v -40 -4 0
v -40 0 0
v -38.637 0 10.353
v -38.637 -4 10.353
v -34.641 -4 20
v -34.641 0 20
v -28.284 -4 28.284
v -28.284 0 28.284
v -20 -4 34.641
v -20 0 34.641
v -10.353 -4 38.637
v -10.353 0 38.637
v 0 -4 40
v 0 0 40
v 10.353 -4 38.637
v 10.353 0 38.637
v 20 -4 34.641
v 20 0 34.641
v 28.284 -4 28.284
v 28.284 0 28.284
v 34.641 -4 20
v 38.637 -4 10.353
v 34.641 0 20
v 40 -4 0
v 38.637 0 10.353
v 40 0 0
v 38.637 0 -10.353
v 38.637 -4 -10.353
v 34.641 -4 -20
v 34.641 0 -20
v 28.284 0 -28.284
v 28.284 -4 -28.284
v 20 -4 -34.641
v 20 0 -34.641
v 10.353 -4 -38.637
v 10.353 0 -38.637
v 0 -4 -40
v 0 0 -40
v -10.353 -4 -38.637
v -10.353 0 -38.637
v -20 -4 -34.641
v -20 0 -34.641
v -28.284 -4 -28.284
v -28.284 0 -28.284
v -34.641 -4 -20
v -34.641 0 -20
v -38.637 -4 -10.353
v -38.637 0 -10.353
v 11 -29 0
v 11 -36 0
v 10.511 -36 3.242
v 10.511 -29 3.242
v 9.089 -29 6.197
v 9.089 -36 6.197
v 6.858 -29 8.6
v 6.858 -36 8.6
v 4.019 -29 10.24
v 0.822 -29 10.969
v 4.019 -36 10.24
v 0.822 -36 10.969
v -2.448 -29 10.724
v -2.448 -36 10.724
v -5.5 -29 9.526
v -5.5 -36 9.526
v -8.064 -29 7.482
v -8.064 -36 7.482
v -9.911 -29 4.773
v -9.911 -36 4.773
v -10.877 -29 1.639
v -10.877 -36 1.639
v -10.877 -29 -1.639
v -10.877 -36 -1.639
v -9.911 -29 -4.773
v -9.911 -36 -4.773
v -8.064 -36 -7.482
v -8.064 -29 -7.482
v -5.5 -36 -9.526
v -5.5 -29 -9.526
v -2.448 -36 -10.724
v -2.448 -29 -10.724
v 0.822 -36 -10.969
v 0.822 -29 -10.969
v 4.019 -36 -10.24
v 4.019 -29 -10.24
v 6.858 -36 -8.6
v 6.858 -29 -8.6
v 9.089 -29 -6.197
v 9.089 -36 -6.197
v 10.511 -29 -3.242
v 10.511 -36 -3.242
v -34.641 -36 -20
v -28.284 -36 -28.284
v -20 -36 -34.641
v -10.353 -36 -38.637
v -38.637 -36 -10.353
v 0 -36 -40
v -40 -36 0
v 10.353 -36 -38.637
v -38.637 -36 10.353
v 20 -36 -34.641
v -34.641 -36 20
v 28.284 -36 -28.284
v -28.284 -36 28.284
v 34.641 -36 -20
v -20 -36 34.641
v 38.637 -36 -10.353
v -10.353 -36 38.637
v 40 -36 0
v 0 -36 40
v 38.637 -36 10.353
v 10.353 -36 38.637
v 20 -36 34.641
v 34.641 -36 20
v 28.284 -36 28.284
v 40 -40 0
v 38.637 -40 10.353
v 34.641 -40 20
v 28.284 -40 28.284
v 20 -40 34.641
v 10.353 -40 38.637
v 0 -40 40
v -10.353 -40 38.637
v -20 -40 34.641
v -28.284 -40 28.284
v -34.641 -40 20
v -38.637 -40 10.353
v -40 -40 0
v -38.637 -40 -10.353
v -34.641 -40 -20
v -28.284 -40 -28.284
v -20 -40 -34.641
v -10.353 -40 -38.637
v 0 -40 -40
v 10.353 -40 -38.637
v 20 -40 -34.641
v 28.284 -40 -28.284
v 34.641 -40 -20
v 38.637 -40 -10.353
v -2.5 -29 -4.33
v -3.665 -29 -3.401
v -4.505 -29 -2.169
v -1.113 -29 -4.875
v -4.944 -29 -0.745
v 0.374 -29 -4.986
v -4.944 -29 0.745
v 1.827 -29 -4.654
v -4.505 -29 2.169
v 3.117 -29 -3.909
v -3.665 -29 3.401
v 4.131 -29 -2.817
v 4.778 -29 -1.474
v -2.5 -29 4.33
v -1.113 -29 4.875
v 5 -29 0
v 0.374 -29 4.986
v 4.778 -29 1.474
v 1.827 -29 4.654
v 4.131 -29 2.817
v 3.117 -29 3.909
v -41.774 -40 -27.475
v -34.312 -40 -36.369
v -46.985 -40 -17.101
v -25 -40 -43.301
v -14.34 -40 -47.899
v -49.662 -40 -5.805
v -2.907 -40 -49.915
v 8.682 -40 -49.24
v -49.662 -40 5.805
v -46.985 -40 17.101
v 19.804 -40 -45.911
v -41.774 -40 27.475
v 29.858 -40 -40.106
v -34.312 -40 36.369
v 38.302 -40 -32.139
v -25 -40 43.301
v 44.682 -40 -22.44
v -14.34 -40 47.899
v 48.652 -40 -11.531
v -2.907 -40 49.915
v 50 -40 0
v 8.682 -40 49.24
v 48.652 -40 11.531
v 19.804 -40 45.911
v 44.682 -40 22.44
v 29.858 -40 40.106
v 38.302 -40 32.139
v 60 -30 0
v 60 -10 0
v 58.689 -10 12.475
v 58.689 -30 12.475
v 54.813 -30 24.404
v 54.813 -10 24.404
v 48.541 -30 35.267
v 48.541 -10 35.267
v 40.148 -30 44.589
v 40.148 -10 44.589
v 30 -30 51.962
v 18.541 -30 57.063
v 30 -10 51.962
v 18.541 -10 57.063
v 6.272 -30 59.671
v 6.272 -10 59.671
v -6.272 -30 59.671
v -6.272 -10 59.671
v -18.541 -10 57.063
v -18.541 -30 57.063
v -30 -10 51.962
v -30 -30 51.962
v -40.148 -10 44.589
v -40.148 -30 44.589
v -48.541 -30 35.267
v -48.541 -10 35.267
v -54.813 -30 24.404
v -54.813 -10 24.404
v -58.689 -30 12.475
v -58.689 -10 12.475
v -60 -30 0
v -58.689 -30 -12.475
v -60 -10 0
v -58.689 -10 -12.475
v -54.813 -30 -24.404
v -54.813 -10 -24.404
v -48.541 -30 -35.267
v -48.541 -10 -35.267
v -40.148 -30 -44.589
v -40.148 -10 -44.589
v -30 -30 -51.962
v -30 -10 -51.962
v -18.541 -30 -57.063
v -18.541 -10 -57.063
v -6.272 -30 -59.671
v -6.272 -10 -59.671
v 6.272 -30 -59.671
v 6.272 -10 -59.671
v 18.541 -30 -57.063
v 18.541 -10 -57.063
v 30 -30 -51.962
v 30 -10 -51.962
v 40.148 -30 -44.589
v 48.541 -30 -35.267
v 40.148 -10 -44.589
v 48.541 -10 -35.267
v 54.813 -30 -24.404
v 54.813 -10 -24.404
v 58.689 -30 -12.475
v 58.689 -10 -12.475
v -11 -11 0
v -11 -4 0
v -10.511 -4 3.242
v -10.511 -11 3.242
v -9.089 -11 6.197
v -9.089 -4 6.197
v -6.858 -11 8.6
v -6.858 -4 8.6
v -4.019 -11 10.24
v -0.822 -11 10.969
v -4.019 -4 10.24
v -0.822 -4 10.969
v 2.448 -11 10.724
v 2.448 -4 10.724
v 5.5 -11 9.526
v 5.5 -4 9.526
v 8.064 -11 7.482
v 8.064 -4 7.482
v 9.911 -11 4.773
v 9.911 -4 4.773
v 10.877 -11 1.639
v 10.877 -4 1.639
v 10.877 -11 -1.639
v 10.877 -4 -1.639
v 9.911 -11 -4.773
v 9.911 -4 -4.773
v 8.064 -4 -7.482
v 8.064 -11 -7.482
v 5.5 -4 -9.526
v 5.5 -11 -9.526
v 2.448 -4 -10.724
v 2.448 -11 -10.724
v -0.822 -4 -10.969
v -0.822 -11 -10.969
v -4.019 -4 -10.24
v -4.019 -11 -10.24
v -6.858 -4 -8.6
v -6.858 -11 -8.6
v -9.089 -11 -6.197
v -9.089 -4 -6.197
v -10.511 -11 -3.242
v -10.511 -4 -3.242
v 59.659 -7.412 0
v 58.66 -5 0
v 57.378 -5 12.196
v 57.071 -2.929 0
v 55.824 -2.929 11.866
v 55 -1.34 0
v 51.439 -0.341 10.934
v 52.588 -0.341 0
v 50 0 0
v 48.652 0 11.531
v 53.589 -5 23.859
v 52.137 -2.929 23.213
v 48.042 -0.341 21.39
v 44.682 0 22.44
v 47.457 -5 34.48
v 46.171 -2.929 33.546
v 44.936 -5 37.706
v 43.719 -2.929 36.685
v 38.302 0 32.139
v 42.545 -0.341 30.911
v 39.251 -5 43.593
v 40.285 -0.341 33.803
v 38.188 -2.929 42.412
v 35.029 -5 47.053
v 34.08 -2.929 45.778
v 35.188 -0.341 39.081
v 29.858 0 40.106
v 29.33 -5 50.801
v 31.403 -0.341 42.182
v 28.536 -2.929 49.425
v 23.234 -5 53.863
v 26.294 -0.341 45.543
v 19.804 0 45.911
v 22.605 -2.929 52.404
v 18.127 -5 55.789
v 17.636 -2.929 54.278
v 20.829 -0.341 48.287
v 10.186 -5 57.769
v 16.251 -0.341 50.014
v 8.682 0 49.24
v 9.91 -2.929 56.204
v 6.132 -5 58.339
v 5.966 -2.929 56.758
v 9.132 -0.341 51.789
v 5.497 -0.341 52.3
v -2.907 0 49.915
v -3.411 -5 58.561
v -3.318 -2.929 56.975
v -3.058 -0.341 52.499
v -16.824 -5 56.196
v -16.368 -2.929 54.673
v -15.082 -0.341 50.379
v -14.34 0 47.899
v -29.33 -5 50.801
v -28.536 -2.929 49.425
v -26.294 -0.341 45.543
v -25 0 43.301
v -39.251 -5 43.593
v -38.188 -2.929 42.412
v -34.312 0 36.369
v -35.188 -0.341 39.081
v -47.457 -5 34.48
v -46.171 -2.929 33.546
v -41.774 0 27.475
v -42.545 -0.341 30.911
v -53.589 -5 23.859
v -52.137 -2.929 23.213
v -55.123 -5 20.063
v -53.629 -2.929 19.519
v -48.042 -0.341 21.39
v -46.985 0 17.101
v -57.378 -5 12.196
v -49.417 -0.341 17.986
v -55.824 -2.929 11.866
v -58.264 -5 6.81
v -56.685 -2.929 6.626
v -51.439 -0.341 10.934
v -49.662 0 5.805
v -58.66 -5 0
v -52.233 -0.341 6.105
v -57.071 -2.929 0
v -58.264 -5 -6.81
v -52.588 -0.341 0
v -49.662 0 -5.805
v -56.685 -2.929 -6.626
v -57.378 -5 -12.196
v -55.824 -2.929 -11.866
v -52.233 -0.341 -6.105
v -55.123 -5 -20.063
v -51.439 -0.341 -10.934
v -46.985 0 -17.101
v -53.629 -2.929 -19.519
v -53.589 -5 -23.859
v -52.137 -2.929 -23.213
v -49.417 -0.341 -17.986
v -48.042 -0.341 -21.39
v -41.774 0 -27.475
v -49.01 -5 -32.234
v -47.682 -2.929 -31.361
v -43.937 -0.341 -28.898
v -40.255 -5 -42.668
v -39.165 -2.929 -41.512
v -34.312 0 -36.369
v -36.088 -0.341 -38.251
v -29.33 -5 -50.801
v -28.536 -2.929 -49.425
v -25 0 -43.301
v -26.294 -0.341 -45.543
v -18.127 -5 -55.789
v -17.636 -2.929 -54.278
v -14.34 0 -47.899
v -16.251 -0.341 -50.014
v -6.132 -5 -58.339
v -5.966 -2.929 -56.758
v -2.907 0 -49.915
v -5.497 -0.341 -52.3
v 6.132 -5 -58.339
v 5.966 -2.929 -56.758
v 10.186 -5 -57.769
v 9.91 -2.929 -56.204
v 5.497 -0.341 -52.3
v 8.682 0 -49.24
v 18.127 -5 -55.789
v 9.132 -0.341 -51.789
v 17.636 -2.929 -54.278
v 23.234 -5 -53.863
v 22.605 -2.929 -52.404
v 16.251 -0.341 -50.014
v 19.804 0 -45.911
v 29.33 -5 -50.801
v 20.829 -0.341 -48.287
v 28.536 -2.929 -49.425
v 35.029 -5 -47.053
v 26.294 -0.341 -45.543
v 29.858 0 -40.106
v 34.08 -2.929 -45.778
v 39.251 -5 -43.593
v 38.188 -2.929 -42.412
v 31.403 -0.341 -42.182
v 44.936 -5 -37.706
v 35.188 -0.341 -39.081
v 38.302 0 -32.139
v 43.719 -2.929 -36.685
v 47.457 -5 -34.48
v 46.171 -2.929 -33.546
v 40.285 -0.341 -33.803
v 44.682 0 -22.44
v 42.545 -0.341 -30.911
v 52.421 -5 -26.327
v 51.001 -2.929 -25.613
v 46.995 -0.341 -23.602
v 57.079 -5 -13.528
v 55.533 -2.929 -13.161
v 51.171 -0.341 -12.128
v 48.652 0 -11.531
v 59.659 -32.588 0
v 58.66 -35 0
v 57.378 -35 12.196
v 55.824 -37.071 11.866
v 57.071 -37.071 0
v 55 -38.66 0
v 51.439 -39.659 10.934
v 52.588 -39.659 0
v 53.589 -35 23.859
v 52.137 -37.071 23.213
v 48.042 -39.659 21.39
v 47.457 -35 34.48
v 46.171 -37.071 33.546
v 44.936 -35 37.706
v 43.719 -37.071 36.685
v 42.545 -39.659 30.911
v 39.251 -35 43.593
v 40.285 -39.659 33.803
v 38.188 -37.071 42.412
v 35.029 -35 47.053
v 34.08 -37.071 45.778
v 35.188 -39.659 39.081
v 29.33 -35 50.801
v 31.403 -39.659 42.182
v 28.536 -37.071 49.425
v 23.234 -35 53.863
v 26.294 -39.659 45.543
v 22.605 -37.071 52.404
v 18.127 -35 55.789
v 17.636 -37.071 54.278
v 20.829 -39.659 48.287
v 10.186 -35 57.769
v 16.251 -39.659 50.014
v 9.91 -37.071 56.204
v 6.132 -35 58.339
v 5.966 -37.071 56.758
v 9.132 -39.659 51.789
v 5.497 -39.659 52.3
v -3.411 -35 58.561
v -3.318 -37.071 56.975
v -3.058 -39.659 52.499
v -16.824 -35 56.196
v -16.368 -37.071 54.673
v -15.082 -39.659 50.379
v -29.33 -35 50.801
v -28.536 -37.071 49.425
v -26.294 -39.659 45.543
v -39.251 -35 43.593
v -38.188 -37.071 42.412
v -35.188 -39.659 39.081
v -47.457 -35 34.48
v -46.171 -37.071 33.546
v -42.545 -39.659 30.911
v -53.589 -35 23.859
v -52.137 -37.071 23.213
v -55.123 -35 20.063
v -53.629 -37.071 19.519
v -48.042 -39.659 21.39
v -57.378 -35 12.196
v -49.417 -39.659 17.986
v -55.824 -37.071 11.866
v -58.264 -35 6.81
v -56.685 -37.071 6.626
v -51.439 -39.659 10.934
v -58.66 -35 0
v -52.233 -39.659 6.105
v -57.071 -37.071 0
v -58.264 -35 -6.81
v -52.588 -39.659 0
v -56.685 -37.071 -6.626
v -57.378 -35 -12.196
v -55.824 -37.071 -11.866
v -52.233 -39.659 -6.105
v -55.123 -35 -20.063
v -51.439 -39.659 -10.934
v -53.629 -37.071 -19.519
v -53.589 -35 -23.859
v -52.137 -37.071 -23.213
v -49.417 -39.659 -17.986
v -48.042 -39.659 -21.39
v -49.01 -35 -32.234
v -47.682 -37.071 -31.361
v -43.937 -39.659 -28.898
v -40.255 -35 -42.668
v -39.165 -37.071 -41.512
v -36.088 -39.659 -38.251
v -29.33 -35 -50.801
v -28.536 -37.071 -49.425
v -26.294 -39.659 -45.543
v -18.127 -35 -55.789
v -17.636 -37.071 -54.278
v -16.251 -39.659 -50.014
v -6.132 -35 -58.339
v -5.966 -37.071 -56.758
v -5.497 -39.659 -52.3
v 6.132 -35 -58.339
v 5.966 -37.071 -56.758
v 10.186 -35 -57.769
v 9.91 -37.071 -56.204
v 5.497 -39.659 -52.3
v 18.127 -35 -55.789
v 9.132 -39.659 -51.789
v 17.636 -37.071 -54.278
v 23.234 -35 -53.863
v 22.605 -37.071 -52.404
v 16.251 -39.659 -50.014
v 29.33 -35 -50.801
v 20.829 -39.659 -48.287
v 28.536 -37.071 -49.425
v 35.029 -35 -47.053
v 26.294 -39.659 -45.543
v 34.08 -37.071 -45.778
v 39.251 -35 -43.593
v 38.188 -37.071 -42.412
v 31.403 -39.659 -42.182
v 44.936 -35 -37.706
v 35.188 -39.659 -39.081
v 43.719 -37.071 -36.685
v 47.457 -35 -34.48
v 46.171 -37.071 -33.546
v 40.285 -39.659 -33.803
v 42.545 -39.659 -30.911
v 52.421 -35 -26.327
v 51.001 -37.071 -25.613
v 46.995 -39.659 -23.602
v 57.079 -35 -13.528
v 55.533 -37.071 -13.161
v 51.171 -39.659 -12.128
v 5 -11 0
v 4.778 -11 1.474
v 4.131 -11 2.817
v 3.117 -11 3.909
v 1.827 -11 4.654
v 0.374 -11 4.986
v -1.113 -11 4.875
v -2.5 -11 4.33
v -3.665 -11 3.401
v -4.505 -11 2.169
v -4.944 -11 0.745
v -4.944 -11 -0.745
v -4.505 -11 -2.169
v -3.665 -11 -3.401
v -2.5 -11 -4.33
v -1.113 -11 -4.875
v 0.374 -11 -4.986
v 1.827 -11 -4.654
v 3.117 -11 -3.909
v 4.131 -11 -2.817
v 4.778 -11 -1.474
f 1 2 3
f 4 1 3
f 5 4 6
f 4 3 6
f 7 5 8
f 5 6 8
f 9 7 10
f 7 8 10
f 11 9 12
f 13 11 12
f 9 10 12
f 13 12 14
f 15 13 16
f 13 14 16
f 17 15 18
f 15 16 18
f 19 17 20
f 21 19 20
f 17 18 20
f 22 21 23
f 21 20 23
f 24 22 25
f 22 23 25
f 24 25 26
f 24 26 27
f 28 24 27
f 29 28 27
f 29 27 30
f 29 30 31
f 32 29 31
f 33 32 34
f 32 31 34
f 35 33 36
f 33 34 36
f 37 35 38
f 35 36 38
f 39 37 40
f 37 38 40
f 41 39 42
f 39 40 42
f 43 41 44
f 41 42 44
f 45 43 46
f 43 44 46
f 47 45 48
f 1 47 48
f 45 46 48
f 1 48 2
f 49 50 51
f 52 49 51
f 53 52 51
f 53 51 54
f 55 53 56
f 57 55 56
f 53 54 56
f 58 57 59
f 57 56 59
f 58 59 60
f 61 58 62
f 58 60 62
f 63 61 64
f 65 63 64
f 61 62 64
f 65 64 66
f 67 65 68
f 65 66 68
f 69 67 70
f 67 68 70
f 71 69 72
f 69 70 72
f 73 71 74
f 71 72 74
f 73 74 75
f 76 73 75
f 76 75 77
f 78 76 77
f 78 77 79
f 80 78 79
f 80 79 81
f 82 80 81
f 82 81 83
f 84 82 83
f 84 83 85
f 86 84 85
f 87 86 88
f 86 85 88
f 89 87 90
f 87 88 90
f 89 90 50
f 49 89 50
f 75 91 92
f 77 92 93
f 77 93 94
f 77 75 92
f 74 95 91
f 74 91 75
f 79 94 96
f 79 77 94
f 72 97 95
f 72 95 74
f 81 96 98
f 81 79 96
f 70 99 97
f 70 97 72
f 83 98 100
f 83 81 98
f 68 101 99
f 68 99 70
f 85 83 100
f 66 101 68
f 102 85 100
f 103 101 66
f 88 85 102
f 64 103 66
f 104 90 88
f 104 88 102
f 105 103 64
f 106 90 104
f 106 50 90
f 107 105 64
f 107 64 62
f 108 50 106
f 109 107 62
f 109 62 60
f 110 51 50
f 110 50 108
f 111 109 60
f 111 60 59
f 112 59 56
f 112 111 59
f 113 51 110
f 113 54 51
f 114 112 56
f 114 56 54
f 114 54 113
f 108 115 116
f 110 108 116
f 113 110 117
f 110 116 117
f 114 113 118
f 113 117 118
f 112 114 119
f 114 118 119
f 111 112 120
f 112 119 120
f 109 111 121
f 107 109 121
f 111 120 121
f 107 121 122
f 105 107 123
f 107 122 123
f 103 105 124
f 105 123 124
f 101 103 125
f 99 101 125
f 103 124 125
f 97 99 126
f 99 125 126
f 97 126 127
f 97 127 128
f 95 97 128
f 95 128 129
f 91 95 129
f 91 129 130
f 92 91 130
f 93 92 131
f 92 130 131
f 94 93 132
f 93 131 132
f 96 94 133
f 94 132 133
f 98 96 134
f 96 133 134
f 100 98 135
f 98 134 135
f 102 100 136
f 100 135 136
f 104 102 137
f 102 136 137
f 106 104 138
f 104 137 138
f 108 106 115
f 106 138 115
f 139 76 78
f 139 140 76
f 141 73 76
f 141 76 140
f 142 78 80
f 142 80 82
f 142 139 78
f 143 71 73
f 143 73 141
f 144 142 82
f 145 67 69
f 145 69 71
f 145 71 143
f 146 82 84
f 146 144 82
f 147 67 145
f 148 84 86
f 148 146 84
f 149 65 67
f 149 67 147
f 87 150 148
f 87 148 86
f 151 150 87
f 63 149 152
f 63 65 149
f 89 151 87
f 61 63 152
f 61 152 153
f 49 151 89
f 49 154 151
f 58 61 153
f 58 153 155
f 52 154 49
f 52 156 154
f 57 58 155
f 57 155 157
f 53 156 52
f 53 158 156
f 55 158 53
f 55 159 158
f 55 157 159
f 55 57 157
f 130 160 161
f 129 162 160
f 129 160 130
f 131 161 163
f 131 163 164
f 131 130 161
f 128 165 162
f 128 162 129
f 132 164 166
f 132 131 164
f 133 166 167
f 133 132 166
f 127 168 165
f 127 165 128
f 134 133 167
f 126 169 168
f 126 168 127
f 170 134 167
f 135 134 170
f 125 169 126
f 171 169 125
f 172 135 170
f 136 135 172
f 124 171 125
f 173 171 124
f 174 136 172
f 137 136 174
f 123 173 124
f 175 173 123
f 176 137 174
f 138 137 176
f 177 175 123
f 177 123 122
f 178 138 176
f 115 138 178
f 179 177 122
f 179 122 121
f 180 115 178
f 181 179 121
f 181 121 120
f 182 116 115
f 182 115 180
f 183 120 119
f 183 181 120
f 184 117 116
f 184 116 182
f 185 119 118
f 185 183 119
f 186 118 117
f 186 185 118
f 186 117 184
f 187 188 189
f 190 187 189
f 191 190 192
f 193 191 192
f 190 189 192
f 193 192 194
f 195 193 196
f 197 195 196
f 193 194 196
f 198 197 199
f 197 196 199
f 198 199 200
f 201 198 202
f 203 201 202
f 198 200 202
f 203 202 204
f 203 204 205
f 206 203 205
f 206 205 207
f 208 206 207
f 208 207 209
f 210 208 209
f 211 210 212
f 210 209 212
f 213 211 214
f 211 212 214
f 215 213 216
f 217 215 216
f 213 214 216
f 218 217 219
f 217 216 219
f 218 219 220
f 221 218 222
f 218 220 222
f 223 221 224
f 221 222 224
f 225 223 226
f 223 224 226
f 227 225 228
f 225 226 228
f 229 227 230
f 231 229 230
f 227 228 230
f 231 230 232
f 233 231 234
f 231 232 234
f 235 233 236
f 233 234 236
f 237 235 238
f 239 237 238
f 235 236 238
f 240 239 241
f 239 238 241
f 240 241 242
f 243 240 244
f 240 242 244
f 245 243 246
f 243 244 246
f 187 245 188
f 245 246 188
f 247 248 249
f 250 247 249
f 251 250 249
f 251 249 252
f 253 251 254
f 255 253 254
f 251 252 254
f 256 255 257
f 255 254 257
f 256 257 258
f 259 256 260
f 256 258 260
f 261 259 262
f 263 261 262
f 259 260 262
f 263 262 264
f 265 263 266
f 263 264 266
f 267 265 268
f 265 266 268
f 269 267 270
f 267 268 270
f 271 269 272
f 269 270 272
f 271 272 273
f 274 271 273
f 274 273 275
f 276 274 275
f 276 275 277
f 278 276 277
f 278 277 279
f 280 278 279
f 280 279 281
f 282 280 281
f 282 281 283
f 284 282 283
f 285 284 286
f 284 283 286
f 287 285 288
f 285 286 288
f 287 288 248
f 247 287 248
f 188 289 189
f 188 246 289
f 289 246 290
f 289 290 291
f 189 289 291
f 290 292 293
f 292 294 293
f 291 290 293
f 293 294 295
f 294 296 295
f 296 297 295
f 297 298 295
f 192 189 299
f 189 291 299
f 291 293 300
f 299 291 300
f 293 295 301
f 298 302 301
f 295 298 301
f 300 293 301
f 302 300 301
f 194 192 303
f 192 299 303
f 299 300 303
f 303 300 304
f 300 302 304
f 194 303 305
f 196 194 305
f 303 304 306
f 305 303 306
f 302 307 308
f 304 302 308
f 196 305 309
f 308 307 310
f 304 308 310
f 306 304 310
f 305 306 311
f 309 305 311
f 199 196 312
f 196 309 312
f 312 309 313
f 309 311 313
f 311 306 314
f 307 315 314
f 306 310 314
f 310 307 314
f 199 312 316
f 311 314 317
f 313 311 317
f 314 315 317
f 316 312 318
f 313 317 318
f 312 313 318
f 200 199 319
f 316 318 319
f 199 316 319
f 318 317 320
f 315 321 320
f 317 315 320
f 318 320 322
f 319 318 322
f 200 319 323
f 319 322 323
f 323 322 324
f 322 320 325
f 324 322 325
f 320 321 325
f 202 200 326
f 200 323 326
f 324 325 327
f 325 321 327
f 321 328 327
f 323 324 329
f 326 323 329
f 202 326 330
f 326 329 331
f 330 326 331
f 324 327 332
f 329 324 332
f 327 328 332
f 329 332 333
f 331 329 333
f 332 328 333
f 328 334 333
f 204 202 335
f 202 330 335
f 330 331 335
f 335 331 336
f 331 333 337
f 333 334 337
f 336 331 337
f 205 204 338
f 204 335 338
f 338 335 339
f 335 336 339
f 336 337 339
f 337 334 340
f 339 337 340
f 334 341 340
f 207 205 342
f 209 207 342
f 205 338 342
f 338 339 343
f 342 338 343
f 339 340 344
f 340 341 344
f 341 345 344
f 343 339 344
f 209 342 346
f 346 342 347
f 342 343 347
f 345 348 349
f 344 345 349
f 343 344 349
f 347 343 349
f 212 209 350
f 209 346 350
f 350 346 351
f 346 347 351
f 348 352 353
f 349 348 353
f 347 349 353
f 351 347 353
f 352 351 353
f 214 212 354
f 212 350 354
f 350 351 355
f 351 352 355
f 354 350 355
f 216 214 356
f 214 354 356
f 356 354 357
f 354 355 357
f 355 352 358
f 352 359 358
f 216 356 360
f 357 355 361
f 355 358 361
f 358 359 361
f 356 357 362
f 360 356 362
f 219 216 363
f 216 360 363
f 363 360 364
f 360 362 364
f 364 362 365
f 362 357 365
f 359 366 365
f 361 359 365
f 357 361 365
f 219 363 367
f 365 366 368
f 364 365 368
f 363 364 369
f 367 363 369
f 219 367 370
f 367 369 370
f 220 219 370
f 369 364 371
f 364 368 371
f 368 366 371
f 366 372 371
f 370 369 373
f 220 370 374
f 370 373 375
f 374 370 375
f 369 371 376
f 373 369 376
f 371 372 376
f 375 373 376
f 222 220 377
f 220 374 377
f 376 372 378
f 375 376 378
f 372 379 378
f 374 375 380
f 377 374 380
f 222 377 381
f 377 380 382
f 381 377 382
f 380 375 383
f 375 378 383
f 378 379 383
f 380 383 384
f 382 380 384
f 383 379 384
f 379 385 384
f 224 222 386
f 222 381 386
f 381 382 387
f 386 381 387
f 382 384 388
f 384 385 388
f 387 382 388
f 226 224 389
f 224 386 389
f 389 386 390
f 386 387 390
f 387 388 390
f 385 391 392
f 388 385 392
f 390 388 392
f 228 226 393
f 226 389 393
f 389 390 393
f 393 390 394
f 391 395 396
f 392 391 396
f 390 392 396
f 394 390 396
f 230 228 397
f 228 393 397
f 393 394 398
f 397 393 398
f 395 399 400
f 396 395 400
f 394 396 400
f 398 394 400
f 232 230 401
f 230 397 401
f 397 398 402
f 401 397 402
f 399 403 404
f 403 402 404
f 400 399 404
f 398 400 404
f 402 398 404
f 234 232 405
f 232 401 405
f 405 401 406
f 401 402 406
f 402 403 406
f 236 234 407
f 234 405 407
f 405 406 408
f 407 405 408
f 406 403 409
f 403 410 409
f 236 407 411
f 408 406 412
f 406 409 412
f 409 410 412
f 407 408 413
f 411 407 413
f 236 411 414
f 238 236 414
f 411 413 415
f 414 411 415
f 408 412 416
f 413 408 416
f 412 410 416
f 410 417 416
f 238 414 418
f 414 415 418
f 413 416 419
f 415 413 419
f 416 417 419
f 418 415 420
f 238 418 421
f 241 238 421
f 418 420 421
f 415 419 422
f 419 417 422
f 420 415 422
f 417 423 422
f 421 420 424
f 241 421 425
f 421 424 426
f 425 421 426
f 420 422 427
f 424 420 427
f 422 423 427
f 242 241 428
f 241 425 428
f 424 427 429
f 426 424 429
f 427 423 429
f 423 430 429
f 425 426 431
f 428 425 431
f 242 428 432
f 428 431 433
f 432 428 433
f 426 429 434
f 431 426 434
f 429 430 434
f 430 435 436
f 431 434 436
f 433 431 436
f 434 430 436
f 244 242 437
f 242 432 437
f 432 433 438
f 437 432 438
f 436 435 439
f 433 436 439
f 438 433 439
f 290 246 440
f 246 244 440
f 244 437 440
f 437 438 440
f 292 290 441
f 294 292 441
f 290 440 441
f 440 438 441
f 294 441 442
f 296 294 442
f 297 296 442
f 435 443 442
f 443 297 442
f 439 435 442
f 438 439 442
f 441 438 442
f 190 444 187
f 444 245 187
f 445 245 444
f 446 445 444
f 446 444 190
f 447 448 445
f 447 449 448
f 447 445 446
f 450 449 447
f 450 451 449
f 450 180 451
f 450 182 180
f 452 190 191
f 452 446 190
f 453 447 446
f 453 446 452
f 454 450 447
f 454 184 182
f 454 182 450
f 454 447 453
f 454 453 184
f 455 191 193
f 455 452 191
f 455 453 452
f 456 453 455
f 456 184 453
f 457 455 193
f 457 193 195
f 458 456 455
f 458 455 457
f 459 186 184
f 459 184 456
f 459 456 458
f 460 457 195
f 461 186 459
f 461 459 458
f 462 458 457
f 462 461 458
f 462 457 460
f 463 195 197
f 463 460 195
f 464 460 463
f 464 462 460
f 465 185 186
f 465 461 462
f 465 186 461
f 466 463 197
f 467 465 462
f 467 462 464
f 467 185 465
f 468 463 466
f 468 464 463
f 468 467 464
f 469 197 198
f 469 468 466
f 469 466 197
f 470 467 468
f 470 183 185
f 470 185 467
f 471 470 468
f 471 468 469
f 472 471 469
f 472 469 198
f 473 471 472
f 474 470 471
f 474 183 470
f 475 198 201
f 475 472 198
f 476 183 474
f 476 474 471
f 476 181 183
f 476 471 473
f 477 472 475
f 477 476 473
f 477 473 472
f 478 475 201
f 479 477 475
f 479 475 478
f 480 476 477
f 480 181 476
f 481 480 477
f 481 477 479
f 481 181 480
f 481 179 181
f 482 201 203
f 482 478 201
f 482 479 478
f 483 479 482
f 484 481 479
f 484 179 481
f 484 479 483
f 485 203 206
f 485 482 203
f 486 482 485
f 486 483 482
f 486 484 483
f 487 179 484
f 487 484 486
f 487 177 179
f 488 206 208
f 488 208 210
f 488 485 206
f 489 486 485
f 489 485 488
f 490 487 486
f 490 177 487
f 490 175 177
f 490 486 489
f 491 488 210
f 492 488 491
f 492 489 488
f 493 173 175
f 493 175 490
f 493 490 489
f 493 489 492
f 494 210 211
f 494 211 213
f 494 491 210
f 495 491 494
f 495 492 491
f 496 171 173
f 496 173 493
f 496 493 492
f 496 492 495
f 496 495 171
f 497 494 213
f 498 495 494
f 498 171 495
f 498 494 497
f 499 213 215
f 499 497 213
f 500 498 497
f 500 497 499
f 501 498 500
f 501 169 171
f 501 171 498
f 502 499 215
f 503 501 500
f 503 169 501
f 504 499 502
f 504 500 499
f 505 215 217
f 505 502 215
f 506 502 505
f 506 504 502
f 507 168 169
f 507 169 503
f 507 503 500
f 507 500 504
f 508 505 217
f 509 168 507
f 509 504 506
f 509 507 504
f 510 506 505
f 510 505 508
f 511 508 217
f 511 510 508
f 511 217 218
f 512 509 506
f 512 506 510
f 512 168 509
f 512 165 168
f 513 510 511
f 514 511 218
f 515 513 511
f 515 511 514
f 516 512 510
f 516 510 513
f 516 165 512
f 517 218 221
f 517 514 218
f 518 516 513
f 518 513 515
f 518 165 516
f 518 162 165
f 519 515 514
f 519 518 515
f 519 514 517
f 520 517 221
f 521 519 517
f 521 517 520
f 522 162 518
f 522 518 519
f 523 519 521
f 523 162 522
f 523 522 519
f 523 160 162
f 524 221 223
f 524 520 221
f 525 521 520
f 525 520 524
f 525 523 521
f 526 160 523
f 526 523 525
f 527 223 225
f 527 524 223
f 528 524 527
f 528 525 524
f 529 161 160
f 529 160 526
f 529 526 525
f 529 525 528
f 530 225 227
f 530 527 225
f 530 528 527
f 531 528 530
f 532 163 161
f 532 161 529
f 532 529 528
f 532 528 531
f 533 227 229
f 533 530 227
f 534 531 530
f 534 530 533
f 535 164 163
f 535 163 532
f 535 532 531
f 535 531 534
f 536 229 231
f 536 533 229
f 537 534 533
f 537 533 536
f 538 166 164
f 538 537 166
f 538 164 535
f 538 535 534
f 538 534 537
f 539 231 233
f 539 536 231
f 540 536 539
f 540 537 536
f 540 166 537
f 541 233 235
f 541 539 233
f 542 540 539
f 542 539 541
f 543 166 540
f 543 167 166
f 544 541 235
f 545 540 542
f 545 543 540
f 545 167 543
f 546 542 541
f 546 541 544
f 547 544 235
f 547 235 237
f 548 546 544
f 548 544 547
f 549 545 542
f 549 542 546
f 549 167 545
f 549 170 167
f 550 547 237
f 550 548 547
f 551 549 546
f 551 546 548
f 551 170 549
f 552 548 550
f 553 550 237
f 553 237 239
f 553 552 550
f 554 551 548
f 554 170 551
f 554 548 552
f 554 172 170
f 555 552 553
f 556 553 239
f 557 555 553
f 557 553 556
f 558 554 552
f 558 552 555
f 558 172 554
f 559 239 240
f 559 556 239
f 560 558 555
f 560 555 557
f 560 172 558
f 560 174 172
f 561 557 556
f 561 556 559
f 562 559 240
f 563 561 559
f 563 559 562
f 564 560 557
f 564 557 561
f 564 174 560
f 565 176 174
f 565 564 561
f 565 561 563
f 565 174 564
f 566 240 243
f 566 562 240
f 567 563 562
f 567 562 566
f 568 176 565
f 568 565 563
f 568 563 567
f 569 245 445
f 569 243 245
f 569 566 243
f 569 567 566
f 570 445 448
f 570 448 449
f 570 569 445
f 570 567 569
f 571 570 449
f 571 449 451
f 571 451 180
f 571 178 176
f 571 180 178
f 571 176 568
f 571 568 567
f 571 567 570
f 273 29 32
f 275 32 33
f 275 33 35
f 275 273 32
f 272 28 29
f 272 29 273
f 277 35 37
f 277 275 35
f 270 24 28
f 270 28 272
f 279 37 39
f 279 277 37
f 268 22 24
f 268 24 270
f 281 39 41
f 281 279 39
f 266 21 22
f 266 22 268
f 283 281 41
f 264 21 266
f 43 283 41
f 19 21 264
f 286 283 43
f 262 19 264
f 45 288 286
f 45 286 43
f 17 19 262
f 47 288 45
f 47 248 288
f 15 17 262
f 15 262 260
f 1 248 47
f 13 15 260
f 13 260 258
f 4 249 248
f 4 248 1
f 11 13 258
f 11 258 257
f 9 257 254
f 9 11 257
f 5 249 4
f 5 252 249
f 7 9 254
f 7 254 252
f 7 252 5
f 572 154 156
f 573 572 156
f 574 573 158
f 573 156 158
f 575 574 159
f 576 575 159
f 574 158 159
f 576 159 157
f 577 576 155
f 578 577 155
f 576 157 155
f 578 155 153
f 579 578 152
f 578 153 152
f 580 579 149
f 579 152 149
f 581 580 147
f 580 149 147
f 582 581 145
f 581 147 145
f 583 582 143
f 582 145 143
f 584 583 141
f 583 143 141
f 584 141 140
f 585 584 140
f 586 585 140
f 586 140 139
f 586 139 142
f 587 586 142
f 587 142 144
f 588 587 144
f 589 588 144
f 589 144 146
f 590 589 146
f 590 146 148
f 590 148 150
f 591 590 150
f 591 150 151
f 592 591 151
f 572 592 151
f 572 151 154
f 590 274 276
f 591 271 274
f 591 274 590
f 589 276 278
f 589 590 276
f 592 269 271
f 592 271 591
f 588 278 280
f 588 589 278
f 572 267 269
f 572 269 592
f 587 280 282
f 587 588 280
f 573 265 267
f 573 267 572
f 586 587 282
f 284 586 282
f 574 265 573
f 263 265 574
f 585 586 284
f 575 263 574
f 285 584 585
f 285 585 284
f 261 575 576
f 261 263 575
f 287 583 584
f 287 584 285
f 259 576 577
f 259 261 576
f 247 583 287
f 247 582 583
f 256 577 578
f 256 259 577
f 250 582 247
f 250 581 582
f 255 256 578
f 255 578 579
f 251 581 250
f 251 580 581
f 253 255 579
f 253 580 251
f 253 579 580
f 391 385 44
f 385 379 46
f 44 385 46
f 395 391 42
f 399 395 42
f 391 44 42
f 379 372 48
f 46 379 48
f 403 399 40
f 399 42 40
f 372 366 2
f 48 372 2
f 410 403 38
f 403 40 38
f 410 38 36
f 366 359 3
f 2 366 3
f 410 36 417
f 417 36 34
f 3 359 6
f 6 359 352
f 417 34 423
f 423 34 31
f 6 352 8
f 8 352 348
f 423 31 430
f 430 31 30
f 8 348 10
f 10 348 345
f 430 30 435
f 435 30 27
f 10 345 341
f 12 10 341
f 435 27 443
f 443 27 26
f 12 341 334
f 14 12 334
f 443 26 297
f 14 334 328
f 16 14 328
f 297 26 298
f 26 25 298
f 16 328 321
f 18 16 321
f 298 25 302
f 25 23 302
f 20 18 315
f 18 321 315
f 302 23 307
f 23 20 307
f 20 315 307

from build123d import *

# Parameters (mm, degrees)
F0_R      = 60
F1_DEPTH  = 40
F3_R      = 10
F2_R      = 40
F4_DEPTH  = 4
F5_R      = 40
F6_DEPTH  = 4
F7_R      = 11
F8_DEPTH  = 7
F9_R      = 11
F10_DEPTH = 7
F12_D     = 10


with BuildPart() as f1:
    # F0 (on Front) → F1 (new body)
    with BuildSketch(Plane.XZ):
        Circle(F0_R)
    extrude(amount=F1_DEPTH)

    # F3
    f3_edges = [f1.edges().sort_by_distance(p)[0] for p in [
        (-60, 0, 0),
        (60, -20, 0),
        (-60, -40, 0),
    ]]
    fillet(f3_edges, radius=F3_R)

    # F2 (on face) → F4 (cut)
    with BuildSketch(Plane.XZ.offset(40)):
        Circle(F2_R)
    extrude(amount=-F4_DEPTH, mode=Mode.SUBTRACT)

    # F5 (on face) → F6 (cut)
    with BuildSketch(Plane(origin=(0, 0, 0), x_dir=(-1, 0, 0), z_dir=(0, 1, 0))):
        Circle(F5_R)
    extrude(amount=-F6_DEPTH, mode=Mode.SUBTRACT)

    # F7 (on face) → F8 (cut)
    with BuildSketch(Plane(origin=(0, -4, 0), x_dir=(-1, 0, 0), z_dir=(0, 1, 0))):
        Circle(F7_R)
    extrude(amount=-F8_DEPTH, mode=Mode.SUBTRACT)

    # F9 (on face) → F10 (cut)
    with BuildSketch(Plane.XZ.offset(36)):
        Circle(F9_R)
    extrude(amount=-F10_DEPTH, mode=Mode.SUBTRACT)

    # F12 (through all)
    with Locations(Plane(origin=(0, -4, 0), x_dir=(-1, 0, 0), z_dir=(0, 1, 0))):
        with Locations((0, 0)):
            Hole(F12_D / 2)


solid = f1.part
